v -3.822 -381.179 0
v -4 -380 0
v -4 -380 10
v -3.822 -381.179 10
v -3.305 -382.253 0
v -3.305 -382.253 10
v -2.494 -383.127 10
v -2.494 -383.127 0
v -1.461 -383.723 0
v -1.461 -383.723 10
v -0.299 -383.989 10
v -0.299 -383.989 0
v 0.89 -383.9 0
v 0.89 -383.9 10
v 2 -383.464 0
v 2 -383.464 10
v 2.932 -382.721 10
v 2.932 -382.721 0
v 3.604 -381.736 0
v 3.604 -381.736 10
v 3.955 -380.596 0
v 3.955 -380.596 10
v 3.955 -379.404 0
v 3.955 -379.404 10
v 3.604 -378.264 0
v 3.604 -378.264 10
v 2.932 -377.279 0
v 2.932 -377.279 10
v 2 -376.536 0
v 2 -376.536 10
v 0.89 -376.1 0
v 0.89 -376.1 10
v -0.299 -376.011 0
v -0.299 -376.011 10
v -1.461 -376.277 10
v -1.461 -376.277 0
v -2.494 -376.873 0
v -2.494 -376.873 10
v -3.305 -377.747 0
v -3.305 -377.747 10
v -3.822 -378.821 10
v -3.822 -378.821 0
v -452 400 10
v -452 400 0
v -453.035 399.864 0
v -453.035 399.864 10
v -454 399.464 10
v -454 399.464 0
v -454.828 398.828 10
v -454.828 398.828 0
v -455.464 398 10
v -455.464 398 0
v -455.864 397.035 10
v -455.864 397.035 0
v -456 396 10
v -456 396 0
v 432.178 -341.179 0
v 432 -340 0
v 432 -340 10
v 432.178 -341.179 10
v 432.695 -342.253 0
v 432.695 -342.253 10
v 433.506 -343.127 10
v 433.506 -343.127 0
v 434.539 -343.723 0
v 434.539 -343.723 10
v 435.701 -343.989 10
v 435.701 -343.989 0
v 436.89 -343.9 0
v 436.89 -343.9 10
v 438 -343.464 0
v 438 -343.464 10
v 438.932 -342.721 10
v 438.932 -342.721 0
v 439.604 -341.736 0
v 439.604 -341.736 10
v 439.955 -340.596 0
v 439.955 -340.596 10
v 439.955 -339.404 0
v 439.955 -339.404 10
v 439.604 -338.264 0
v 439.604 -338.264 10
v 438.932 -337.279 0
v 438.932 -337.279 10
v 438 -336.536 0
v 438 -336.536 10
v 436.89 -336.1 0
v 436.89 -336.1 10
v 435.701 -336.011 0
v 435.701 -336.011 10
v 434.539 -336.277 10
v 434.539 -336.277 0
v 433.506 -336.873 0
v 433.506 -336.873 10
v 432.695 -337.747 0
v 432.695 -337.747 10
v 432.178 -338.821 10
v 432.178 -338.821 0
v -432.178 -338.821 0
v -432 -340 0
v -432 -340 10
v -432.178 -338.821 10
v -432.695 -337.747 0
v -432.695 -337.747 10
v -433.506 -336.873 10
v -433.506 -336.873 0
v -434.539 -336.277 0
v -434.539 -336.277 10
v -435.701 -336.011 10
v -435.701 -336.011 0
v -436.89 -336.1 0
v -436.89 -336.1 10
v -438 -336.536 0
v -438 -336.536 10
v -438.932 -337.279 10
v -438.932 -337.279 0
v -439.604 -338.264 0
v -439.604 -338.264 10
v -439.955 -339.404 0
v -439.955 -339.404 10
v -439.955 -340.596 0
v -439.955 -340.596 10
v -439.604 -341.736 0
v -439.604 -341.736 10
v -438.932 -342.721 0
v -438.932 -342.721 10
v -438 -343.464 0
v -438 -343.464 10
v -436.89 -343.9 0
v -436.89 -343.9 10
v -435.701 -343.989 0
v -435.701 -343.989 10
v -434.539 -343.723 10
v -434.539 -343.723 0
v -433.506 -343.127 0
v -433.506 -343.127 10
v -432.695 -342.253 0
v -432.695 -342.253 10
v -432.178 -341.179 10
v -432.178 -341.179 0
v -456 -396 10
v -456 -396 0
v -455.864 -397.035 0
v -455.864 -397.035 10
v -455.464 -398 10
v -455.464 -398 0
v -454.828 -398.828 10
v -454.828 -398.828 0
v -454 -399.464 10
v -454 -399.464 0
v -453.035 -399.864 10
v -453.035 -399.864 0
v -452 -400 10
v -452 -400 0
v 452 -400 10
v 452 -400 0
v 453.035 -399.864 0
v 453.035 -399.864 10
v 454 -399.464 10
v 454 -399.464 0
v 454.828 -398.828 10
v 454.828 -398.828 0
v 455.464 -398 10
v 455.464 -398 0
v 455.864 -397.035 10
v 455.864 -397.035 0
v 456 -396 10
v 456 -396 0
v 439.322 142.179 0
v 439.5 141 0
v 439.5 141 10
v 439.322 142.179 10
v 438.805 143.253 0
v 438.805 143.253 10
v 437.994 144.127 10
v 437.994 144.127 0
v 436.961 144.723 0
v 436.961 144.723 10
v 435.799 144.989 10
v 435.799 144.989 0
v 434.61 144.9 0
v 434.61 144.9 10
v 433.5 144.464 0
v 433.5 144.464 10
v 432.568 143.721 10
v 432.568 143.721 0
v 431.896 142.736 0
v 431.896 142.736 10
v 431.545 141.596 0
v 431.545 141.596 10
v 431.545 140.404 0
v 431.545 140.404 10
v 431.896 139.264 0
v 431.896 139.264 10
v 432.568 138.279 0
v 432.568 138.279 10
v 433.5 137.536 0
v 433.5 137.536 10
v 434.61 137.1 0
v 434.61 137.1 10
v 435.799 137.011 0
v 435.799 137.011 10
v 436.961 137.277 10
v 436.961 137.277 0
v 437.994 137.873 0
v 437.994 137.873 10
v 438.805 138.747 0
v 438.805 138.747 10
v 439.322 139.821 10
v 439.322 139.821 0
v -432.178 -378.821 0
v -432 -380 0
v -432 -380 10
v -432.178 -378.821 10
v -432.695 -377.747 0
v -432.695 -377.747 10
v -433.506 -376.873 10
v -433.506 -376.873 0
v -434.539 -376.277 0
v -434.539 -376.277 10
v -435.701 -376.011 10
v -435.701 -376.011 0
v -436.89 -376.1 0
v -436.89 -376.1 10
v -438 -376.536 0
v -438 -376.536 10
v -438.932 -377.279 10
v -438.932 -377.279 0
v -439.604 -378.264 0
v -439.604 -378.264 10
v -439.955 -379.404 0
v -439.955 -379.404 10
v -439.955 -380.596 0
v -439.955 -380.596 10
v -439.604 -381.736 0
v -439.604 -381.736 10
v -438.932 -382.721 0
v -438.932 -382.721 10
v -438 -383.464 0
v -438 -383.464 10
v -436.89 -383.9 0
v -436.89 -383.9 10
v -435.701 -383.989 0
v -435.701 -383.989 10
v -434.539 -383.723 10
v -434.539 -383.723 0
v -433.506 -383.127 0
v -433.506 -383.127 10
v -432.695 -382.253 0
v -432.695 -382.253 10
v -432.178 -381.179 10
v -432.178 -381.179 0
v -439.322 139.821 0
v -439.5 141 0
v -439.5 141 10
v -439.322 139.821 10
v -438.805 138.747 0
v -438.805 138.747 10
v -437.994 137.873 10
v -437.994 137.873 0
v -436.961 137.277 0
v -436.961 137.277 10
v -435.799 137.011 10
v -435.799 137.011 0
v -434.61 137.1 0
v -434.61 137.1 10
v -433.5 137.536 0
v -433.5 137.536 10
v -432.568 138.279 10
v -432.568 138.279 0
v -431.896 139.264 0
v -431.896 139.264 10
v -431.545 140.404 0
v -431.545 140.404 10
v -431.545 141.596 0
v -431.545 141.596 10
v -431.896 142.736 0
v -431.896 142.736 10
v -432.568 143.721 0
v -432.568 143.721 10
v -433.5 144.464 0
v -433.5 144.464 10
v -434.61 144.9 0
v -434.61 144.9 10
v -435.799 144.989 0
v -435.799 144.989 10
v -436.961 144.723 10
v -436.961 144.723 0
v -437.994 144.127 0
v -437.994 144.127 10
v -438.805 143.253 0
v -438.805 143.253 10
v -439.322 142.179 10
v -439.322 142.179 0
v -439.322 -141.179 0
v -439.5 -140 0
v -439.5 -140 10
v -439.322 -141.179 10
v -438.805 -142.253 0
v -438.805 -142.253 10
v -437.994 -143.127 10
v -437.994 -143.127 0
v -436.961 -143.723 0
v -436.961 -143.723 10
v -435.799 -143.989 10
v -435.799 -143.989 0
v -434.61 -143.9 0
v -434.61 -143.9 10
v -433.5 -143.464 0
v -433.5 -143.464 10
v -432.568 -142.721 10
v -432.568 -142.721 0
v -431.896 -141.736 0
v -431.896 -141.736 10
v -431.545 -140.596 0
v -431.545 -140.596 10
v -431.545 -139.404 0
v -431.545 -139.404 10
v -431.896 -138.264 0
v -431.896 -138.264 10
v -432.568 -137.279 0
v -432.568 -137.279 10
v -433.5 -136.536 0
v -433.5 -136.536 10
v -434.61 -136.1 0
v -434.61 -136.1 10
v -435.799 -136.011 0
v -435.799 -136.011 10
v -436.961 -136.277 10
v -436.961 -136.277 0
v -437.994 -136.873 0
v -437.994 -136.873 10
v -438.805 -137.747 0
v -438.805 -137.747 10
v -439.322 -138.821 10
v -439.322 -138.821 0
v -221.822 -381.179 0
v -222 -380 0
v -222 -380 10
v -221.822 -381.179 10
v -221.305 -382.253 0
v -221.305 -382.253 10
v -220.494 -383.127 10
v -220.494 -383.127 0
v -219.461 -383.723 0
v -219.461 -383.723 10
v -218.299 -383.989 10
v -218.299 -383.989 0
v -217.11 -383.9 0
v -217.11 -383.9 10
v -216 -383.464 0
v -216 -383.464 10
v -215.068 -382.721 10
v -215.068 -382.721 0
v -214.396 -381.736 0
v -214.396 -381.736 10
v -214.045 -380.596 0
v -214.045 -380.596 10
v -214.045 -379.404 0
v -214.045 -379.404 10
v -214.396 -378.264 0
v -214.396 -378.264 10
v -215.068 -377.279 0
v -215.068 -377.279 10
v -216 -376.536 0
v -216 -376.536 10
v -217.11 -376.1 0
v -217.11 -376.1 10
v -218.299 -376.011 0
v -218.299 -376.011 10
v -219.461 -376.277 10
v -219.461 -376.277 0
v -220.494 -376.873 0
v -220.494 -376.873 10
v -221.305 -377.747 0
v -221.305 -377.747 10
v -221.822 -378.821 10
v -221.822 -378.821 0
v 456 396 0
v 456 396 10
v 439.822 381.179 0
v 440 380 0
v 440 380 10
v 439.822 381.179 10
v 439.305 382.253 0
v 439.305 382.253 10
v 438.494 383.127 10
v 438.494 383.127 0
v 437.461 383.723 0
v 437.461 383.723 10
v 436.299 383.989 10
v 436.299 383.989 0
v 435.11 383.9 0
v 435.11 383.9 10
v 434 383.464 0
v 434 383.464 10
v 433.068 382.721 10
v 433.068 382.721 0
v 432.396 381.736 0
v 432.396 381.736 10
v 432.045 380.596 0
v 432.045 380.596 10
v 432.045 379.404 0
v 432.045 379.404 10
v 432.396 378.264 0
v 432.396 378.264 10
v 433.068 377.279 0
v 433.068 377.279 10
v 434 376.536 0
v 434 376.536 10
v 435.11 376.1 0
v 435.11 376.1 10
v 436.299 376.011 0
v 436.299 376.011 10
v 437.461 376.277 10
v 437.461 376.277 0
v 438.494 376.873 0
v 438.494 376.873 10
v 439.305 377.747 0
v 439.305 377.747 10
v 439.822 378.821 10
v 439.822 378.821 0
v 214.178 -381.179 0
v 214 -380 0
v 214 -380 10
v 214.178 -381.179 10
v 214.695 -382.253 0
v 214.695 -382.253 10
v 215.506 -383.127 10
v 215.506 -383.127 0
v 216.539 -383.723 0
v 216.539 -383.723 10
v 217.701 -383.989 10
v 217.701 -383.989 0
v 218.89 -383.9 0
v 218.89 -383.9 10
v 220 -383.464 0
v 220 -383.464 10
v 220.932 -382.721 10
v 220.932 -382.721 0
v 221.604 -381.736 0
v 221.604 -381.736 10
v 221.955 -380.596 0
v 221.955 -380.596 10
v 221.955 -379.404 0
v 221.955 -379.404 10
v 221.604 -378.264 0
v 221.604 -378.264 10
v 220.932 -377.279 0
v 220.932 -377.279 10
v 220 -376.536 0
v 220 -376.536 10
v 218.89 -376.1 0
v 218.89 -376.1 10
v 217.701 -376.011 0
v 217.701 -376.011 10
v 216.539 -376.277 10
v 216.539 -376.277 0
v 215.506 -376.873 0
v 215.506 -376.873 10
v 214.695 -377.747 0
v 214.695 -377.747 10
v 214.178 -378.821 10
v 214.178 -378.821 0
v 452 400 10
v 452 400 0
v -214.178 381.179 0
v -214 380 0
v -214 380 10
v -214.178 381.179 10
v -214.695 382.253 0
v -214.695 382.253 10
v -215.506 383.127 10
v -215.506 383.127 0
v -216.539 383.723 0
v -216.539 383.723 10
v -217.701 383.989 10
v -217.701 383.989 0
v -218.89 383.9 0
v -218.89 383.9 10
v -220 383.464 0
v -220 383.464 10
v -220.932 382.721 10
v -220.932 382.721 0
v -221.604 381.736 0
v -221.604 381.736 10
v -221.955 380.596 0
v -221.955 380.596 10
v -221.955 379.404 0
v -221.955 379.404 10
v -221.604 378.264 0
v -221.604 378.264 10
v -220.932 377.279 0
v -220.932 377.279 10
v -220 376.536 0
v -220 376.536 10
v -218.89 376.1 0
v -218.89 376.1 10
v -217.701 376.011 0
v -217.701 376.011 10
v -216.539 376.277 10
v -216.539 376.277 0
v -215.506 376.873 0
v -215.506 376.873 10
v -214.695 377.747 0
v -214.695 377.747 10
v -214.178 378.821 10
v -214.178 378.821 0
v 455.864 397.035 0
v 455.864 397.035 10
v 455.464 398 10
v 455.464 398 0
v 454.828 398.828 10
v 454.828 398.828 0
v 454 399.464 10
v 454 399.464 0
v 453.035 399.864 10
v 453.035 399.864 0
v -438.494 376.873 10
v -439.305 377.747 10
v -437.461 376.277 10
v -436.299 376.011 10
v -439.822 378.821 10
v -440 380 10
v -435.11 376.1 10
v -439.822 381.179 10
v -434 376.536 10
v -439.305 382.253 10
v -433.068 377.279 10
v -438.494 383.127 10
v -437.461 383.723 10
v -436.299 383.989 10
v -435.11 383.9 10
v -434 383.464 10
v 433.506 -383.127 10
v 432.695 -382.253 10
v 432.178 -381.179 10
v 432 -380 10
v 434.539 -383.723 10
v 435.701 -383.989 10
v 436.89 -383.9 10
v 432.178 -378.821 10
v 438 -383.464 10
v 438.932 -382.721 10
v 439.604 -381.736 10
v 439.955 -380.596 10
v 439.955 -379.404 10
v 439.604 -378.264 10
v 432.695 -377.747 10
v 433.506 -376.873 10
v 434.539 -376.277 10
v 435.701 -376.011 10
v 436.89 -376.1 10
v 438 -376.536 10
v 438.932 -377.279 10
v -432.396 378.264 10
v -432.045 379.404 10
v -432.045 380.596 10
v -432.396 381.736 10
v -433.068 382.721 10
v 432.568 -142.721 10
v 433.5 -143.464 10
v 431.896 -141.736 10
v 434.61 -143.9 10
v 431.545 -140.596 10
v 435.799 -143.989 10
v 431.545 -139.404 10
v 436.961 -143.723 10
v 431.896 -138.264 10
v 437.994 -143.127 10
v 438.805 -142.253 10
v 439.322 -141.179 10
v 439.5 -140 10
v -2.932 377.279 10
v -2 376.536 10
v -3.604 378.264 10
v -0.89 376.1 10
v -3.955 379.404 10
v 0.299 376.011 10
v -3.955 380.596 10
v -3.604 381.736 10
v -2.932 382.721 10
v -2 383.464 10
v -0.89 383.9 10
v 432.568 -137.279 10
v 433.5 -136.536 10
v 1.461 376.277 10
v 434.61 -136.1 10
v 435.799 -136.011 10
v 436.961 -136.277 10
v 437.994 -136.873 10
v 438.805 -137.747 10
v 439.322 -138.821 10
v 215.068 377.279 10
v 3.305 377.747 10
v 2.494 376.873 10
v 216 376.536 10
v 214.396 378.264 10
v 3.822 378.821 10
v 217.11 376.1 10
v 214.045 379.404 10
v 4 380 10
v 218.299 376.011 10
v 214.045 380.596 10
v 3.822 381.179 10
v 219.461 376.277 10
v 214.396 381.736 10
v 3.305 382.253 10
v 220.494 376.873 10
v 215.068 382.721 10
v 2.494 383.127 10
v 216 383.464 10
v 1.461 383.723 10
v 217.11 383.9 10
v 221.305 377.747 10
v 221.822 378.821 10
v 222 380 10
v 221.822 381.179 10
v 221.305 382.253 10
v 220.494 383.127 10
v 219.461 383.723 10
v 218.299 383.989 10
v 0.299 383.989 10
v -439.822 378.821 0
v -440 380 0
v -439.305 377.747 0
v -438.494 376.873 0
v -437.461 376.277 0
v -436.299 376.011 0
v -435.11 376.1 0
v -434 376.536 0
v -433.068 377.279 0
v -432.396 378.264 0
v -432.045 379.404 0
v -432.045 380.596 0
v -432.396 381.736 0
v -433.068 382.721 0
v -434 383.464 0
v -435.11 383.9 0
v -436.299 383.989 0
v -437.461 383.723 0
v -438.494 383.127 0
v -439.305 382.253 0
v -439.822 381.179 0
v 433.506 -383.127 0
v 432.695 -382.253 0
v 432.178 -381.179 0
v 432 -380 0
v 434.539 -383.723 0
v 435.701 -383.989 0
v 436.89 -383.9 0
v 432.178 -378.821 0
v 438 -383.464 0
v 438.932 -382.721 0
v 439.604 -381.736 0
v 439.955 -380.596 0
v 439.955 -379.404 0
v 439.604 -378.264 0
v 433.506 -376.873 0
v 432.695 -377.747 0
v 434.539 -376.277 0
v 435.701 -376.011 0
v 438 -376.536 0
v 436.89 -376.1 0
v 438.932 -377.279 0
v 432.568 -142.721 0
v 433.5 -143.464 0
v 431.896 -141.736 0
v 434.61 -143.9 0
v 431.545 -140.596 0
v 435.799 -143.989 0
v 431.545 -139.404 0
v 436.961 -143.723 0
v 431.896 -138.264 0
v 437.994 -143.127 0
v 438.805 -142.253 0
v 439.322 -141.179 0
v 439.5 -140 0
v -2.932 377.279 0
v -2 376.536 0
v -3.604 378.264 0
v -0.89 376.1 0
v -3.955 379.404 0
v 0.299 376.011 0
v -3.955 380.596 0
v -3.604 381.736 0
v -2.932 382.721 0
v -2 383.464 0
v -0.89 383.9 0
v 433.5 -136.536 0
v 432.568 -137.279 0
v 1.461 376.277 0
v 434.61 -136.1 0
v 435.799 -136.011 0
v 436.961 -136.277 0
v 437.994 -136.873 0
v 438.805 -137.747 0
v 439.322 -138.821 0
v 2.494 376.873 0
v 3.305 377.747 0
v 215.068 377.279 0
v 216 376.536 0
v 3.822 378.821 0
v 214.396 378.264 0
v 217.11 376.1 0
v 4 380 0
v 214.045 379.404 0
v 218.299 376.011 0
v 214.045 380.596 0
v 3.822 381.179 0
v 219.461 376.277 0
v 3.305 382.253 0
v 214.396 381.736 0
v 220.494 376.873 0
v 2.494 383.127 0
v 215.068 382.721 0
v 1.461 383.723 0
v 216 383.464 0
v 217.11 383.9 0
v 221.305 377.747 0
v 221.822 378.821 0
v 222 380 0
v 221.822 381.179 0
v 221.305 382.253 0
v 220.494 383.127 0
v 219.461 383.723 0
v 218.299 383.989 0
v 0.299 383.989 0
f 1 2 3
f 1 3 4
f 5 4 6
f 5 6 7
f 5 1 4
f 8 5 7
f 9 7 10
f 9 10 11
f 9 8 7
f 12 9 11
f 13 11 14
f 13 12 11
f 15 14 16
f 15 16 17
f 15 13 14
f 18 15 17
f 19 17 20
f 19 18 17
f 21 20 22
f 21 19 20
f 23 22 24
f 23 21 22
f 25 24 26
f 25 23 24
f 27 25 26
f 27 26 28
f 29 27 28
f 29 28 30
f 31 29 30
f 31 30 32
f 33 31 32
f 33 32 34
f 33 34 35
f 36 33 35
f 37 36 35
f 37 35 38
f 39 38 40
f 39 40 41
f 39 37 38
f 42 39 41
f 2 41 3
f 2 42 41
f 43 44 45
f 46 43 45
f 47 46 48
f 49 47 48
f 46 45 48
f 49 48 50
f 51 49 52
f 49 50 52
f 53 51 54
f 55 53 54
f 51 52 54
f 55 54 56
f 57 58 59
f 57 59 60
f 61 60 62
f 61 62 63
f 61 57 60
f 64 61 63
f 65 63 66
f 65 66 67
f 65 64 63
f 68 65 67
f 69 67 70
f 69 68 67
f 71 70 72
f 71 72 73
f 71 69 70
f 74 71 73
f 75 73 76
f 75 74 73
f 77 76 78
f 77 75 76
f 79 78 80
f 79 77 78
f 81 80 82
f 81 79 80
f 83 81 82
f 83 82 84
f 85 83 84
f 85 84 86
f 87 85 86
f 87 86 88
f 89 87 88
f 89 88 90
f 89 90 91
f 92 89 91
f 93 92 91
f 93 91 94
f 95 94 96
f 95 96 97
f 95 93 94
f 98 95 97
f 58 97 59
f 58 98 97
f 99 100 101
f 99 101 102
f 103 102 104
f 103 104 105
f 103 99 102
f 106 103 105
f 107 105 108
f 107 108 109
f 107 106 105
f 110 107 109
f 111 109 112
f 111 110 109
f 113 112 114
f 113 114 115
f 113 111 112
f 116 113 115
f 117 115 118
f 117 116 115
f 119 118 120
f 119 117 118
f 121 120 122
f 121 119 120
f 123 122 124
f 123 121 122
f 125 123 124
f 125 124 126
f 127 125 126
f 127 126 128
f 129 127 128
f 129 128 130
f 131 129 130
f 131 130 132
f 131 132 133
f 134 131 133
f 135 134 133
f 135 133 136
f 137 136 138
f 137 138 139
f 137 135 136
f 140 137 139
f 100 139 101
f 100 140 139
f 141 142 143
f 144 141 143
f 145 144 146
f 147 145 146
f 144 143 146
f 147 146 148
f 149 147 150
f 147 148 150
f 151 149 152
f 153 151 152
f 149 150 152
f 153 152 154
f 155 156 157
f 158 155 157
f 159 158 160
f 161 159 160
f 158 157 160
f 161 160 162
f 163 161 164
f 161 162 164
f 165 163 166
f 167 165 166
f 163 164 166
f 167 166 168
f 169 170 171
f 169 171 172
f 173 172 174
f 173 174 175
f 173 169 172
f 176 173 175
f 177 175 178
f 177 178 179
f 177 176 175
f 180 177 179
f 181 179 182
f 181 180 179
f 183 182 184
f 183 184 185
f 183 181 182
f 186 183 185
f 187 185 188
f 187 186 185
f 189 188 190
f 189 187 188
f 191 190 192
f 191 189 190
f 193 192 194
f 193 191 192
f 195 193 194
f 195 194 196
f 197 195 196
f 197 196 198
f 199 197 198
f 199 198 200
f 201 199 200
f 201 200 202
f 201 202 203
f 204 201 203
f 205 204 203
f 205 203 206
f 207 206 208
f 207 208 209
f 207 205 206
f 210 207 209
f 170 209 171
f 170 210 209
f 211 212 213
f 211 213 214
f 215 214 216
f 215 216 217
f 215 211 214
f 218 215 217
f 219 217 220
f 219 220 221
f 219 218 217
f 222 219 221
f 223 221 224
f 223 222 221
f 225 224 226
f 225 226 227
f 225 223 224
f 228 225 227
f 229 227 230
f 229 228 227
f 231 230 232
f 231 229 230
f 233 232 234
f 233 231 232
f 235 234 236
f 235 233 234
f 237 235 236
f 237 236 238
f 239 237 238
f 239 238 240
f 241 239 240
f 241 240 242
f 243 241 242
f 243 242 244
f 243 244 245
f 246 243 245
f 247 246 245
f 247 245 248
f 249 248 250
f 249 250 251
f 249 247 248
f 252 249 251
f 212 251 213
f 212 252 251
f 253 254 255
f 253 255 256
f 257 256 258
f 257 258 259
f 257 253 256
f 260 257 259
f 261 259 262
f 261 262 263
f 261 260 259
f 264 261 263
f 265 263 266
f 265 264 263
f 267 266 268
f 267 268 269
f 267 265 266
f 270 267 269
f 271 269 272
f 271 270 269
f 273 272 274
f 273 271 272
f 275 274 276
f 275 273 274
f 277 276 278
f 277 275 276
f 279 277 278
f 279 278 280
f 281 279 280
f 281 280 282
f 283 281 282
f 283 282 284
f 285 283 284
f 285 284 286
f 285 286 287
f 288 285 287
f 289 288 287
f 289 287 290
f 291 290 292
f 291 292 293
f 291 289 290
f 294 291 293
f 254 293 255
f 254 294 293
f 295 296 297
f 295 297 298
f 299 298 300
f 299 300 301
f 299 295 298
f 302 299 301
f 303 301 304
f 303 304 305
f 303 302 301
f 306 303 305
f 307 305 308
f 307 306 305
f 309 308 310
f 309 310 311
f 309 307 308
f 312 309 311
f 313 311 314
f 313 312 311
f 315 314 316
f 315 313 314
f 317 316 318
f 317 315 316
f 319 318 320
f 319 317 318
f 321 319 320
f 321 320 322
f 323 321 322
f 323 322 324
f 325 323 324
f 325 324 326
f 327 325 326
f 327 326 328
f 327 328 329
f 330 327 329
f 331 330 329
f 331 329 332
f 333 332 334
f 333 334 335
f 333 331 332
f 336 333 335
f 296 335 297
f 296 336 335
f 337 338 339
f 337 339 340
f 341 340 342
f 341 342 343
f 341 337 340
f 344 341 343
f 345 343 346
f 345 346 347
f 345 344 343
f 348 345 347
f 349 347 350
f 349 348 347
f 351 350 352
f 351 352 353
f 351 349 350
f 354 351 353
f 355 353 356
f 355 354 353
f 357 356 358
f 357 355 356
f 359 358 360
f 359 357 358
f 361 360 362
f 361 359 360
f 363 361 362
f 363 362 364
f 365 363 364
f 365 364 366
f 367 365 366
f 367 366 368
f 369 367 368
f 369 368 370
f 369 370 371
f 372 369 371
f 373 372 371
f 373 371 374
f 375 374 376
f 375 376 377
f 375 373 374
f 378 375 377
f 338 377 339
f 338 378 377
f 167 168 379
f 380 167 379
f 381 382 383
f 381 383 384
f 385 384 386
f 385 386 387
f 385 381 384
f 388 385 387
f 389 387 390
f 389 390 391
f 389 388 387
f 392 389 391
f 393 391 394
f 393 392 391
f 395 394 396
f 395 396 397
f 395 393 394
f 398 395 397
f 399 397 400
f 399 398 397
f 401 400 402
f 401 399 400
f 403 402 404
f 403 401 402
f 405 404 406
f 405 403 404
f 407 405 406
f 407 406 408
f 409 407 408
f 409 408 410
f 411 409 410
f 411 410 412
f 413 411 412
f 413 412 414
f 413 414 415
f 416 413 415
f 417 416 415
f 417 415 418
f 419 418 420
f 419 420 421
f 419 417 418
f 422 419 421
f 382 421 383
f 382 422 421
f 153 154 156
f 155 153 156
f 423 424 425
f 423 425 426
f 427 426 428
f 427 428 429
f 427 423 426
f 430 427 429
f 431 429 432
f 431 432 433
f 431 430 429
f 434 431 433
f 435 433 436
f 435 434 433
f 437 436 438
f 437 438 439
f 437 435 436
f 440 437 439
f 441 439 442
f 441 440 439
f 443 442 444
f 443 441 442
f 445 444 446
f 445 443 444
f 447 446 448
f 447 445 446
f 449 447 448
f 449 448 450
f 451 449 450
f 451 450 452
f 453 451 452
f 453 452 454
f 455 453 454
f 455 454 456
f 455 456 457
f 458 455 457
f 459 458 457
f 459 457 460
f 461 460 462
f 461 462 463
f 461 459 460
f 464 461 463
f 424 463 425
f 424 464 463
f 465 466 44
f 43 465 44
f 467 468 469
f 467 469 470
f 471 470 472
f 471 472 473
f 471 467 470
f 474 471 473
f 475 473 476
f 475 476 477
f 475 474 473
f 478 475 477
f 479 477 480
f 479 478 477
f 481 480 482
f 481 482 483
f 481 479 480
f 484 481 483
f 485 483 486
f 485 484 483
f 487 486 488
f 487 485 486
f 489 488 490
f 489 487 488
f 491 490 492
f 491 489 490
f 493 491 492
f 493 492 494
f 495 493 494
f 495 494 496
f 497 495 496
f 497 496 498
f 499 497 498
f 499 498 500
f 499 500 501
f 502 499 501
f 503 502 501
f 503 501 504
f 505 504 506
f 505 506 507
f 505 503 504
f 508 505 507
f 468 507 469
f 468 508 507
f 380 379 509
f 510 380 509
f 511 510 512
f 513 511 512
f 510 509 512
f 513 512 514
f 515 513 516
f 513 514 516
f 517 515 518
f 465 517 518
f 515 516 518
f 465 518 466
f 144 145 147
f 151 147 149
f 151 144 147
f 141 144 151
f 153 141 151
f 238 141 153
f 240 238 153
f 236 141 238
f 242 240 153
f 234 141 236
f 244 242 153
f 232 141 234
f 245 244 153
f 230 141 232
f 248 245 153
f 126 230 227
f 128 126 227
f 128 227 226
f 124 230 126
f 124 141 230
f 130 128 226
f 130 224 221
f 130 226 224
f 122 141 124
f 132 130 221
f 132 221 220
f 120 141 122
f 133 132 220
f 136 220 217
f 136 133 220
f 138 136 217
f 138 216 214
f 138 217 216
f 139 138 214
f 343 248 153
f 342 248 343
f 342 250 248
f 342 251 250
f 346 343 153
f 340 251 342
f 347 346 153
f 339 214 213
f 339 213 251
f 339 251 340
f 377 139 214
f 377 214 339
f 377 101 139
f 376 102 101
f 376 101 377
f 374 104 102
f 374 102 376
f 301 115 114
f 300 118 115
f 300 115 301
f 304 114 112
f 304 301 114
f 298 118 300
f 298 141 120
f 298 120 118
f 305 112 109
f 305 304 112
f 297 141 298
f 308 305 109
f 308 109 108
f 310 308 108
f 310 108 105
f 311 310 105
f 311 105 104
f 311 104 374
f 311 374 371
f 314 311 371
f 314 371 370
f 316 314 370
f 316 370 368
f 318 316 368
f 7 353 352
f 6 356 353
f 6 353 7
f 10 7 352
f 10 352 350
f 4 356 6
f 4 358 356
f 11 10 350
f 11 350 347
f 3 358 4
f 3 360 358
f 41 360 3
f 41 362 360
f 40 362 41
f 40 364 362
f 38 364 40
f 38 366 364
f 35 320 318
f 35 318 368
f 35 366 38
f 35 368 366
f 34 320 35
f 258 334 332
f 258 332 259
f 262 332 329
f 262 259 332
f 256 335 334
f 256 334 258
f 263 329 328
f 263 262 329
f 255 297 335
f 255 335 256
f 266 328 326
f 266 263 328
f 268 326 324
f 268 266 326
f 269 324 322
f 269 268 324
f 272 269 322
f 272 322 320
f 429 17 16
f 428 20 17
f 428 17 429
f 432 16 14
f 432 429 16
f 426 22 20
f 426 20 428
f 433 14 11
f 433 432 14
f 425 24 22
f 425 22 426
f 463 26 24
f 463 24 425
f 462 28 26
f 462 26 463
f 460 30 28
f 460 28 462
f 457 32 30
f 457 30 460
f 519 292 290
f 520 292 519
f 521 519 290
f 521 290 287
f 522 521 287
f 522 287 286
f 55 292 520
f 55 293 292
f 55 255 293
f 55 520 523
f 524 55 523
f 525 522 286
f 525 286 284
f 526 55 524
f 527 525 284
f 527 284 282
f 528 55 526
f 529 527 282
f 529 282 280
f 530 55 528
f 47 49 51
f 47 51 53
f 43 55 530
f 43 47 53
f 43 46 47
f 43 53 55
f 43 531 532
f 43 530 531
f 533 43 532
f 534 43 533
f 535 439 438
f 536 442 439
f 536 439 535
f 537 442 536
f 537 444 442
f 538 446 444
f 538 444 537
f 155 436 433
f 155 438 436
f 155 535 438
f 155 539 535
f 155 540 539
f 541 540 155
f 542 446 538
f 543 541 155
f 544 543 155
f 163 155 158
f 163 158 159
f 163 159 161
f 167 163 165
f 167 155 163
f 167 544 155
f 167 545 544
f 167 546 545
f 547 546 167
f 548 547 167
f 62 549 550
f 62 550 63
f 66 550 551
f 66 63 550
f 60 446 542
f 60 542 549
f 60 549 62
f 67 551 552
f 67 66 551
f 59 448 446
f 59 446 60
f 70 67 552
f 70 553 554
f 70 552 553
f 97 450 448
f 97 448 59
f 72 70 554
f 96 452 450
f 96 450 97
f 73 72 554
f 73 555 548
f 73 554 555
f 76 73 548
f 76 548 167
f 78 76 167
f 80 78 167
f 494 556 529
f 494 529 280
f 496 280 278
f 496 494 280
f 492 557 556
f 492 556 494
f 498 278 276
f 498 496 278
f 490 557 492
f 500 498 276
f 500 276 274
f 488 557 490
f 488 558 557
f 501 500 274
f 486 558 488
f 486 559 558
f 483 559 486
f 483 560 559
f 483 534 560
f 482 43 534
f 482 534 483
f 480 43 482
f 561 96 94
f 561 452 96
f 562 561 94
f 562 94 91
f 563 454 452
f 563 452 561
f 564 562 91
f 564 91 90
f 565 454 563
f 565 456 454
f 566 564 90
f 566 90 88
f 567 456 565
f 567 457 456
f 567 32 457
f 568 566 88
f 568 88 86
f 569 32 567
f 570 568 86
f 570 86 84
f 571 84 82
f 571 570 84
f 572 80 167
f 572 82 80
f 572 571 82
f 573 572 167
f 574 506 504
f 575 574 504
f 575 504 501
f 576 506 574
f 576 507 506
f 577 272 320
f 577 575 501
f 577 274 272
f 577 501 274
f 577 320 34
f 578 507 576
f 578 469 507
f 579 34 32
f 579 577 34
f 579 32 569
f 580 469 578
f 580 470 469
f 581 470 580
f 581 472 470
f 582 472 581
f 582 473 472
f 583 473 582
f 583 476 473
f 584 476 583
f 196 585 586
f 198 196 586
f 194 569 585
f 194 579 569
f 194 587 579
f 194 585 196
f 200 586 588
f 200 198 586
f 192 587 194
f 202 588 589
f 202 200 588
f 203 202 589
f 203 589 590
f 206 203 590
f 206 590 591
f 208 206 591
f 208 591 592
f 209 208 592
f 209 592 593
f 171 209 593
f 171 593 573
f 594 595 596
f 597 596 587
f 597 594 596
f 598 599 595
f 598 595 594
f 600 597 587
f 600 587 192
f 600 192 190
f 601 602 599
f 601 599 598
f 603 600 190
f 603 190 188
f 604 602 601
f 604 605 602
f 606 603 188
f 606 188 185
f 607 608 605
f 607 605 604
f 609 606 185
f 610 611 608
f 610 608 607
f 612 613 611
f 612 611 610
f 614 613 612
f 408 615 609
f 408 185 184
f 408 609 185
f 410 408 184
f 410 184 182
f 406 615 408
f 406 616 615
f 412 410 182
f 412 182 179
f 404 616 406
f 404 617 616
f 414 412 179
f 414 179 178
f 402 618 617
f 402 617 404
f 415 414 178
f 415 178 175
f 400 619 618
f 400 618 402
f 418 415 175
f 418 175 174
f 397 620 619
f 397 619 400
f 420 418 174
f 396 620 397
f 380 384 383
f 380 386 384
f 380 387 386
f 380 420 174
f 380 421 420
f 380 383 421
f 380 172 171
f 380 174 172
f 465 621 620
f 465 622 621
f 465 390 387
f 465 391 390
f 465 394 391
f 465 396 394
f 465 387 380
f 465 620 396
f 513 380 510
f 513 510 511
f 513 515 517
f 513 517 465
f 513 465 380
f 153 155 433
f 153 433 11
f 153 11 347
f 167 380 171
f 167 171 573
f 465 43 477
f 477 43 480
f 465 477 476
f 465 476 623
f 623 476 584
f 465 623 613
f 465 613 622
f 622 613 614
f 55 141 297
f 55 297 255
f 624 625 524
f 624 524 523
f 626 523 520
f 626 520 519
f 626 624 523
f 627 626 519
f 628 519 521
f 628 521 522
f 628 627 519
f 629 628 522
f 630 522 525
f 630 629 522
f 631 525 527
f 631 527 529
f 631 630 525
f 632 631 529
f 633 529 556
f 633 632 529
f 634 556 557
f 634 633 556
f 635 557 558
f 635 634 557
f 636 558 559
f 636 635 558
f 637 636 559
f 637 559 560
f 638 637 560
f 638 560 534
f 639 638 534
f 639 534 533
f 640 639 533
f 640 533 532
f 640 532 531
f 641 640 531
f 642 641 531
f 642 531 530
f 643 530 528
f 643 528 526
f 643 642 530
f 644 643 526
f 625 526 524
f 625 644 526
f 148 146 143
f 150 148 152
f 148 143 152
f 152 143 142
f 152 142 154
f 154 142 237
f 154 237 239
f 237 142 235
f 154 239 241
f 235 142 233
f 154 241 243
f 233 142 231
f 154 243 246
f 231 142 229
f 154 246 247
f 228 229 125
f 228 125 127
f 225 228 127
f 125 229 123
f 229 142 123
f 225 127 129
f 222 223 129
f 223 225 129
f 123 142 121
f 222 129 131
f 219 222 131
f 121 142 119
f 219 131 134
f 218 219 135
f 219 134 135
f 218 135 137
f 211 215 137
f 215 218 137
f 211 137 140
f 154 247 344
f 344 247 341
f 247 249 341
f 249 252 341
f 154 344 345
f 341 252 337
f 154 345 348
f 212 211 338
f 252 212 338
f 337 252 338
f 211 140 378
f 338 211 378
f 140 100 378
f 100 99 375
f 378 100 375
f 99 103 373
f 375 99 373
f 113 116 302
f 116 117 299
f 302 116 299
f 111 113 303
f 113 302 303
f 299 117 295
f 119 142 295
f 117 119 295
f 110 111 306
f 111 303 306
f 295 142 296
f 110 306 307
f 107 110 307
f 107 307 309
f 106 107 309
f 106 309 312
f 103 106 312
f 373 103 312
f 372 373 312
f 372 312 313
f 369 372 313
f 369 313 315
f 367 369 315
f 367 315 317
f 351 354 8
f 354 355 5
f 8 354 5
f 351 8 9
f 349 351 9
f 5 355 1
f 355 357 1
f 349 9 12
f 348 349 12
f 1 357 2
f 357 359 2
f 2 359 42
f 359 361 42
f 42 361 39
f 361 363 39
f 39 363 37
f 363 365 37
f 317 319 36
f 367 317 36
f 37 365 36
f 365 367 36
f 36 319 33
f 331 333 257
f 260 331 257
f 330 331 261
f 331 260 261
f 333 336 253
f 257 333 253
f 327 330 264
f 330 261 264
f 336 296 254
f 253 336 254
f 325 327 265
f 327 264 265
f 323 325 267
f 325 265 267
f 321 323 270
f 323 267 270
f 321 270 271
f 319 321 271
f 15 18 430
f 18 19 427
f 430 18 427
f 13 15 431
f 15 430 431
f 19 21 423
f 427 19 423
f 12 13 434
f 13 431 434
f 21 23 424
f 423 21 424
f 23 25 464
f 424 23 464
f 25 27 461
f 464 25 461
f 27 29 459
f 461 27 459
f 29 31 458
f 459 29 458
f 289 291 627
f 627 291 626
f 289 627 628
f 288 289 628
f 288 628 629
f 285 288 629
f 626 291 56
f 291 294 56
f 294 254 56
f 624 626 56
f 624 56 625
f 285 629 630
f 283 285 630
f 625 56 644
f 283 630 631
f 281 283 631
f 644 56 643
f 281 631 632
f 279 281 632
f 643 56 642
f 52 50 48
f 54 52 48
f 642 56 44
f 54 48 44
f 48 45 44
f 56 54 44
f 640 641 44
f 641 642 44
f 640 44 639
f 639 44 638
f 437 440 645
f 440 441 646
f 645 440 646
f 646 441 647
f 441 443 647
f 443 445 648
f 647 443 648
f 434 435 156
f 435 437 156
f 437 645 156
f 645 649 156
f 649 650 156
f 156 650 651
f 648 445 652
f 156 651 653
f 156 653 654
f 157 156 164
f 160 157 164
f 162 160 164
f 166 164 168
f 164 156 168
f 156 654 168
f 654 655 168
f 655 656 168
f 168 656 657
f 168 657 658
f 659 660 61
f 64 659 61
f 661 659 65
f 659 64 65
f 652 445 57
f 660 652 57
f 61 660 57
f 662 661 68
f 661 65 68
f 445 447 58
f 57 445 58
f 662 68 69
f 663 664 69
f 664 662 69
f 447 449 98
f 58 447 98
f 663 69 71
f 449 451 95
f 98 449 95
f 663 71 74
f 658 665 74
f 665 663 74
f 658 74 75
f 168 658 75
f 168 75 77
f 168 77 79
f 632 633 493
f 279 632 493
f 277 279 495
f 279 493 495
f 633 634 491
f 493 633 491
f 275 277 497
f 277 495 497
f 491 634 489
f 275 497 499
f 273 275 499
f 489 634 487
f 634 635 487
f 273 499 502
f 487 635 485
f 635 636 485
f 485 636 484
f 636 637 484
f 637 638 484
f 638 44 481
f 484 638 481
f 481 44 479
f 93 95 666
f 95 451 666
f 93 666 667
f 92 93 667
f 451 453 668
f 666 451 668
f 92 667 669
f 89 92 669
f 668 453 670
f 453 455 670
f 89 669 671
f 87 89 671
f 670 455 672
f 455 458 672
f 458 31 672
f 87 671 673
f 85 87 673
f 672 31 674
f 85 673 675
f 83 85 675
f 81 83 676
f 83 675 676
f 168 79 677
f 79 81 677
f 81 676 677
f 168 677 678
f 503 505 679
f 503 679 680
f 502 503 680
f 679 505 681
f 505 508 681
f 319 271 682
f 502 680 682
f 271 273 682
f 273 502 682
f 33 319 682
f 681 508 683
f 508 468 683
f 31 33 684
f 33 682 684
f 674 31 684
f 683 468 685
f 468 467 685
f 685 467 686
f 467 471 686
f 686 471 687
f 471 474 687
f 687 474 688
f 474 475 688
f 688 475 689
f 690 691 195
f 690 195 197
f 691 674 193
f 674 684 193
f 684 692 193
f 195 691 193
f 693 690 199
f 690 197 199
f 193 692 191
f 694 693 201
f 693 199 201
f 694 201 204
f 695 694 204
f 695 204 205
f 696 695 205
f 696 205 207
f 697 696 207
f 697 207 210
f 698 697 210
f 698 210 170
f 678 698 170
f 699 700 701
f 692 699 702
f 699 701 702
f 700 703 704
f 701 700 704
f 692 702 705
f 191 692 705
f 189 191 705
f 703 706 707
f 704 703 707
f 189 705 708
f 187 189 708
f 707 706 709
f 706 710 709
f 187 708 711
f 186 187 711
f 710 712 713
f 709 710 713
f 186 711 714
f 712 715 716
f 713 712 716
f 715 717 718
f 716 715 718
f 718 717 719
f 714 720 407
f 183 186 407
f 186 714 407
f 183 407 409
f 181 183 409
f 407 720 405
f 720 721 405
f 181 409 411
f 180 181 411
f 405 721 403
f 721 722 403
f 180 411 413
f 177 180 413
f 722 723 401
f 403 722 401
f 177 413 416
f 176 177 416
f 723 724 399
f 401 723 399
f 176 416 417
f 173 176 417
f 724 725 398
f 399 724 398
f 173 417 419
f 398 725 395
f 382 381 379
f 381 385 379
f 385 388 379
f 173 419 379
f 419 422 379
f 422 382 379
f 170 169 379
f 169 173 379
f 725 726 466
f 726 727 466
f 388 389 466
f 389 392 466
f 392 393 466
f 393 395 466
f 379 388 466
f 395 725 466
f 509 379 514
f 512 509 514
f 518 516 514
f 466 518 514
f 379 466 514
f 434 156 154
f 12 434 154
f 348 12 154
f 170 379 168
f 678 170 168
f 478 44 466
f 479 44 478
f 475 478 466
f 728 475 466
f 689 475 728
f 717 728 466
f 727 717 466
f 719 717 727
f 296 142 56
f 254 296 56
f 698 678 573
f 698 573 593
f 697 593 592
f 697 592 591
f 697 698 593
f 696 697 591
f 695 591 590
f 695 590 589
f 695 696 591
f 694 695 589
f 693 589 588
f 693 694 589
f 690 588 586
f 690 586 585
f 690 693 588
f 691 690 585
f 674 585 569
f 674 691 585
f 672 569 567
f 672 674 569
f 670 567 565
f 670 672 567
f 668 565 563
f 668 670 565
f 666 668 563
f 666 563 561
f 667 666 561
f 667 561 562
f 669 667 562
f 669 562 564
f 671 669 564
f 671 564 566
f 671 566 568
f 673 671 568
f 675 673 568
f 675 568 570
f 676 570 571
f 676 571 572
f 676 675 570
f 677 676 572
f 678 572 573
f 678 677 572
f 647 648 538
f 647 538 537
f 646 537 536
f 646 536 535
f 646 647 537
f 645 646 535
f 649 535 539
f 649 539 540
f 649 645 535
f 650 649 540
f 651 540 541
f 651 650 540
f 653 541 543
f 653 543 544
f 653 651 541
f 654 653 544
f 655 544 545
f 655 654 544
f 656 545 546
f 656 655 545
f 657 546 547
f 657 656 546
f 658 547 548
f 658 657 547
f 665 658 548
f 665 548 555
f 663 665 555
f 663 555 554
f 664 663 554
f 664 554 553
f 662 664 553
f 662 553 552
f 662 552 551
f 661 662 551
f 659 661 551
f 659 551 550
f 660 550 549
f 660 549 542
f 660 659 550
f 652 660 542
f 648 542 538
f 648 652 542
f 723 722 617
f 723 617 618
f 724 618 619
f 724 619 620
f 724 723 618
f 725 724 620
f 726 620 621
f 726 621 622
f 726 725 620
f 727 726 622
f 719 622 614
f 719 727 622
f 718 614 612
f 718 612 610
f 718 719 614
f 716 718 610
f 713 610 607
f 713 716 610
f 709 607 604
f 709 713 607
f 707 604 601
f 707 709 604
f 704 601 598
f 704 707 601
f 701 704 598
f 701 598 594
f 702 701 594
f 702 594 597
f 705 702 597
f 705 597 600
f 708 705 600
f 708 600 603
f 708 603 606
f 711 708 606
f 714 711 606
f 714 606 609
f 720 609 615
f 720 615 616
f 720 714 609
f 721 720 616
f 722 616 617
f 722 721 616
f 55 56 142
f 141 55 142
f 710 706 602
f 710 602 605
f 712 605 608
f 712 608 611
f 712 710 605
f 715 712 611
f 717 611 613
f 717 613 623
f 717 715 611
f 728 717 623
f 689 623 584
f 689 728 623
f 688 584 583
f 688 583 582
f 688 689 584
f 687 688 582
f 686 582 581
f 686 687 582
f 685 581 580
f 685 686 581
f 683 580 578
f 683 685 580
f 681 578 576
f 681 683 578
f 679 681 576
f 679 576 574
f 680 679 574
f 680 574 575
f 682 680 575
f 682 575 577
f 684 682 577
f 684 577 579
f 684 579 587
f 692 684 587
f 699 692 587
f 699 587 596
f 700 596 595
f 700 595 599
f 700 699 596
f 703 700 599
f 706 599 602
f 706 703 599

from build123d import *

# Parameters (mm, degrees)
ESQUISSE1_R        = 4
BOSS_EXTRU_1_DEPTH = 10


with BuildPart() as part:
    # Esquisse1 → Boss.-Extru.1 (new body)
    with BuildSketch(Plane.XY):
        with BuildLine():
            Line((-452, -400), (452, -400))
            ThreePointArc((452, -400), (454.828427125, -398.828427125), (456, -396))
            Line((456, -396), (456, 396))
            ThreePointArc((456, 396), (454.828427125, 398.828427125), (452, 400))
            Line((452, 400), (-452, 400))
            ThreePointArc((-452, 400), (-454.828427125, 398.828427125), (-456, 396))
            Line((-456, 396), (-456, -396))
            ThreePointArc((-456, -396), (-454.828427125, -398.828427125), (-452, -400))
        make_face()
        with Locations((436, 380)):
            Circle(ESQUISSE1_R, mode=Mode.SUBTRACT)
        with Locations((435.5, -140)):
            Circle(ESQUISSE1_R, mode=Mode.SUBTRACT)
        with Locations((435.5, 141)):
            Circle(ESQUISSE1_R, mode=Mode.SUBTRACT)
        with Locations(Location((-435.5, -140, 0), (0, 0, 180))):
            Circle(ESQUISSE1_R, mode=Mode.SUBTRACT)
        with Locations(Location((-436, 380, 0), (0, 0, 180))):
            Circle(ESQUISSE1_R, mode=Mode.SUBTRACT)
        with Locations(Location((-435.5, 141, 0), (0, 0, 180))):
            Circle(ESQUISSE1_R, mode=Mode.SUBTRACT)
        with Locations(Location((436, -380, 0), (0, 0, 180))):
            Circle(ESQUISSE1_R, mode=Mode.SUBTRACT)
        with Locations(Location((436, -340, 0), (0, 0, 180))):
            Circle(ESQUISSE1_R, mode=Mode.SUBTRACT)
        with Locations((-436, -340)):
            Circle(ESQUISSE1_R, mode=Mode.SUBTRACT)
        with Locations((-436, -380)):
            Circle(ESQUISSE1_R, mode=Mode.SUBTRACT)
        with Locations(Location((218, -380, 0), (0, 0, 180))):
            Circle(ESQUISSE1_R, mode=Mode.SUBTRACT)
        with Locations(Location((0, -380, 0), (0, 0, 180))):
            Circle(ESQUISSE1_R, mode=Mode.SUBTRACT)
        with Locations(Location((-218, -380, 0), (0, 0, 180))):
            Circle(ESQUISSE1_R, mode=Mode.SUBTRACT)
        with Locations((-218, 380)):
            Circle(ESQUISSE1_R, mode=Mode.SUBTRACT)
        with Locations((0, 380)):
            Circle(ESQUISSE1_R, mode=Mode.SUBTRACT)
        with Locations((218, 380)):
            Circle(ESQUISSE1_R, mode=Mode.SUBTRACT)
    extrude(amount=BOSS_EXTRU_1_DEPTH)


solid = part.part
